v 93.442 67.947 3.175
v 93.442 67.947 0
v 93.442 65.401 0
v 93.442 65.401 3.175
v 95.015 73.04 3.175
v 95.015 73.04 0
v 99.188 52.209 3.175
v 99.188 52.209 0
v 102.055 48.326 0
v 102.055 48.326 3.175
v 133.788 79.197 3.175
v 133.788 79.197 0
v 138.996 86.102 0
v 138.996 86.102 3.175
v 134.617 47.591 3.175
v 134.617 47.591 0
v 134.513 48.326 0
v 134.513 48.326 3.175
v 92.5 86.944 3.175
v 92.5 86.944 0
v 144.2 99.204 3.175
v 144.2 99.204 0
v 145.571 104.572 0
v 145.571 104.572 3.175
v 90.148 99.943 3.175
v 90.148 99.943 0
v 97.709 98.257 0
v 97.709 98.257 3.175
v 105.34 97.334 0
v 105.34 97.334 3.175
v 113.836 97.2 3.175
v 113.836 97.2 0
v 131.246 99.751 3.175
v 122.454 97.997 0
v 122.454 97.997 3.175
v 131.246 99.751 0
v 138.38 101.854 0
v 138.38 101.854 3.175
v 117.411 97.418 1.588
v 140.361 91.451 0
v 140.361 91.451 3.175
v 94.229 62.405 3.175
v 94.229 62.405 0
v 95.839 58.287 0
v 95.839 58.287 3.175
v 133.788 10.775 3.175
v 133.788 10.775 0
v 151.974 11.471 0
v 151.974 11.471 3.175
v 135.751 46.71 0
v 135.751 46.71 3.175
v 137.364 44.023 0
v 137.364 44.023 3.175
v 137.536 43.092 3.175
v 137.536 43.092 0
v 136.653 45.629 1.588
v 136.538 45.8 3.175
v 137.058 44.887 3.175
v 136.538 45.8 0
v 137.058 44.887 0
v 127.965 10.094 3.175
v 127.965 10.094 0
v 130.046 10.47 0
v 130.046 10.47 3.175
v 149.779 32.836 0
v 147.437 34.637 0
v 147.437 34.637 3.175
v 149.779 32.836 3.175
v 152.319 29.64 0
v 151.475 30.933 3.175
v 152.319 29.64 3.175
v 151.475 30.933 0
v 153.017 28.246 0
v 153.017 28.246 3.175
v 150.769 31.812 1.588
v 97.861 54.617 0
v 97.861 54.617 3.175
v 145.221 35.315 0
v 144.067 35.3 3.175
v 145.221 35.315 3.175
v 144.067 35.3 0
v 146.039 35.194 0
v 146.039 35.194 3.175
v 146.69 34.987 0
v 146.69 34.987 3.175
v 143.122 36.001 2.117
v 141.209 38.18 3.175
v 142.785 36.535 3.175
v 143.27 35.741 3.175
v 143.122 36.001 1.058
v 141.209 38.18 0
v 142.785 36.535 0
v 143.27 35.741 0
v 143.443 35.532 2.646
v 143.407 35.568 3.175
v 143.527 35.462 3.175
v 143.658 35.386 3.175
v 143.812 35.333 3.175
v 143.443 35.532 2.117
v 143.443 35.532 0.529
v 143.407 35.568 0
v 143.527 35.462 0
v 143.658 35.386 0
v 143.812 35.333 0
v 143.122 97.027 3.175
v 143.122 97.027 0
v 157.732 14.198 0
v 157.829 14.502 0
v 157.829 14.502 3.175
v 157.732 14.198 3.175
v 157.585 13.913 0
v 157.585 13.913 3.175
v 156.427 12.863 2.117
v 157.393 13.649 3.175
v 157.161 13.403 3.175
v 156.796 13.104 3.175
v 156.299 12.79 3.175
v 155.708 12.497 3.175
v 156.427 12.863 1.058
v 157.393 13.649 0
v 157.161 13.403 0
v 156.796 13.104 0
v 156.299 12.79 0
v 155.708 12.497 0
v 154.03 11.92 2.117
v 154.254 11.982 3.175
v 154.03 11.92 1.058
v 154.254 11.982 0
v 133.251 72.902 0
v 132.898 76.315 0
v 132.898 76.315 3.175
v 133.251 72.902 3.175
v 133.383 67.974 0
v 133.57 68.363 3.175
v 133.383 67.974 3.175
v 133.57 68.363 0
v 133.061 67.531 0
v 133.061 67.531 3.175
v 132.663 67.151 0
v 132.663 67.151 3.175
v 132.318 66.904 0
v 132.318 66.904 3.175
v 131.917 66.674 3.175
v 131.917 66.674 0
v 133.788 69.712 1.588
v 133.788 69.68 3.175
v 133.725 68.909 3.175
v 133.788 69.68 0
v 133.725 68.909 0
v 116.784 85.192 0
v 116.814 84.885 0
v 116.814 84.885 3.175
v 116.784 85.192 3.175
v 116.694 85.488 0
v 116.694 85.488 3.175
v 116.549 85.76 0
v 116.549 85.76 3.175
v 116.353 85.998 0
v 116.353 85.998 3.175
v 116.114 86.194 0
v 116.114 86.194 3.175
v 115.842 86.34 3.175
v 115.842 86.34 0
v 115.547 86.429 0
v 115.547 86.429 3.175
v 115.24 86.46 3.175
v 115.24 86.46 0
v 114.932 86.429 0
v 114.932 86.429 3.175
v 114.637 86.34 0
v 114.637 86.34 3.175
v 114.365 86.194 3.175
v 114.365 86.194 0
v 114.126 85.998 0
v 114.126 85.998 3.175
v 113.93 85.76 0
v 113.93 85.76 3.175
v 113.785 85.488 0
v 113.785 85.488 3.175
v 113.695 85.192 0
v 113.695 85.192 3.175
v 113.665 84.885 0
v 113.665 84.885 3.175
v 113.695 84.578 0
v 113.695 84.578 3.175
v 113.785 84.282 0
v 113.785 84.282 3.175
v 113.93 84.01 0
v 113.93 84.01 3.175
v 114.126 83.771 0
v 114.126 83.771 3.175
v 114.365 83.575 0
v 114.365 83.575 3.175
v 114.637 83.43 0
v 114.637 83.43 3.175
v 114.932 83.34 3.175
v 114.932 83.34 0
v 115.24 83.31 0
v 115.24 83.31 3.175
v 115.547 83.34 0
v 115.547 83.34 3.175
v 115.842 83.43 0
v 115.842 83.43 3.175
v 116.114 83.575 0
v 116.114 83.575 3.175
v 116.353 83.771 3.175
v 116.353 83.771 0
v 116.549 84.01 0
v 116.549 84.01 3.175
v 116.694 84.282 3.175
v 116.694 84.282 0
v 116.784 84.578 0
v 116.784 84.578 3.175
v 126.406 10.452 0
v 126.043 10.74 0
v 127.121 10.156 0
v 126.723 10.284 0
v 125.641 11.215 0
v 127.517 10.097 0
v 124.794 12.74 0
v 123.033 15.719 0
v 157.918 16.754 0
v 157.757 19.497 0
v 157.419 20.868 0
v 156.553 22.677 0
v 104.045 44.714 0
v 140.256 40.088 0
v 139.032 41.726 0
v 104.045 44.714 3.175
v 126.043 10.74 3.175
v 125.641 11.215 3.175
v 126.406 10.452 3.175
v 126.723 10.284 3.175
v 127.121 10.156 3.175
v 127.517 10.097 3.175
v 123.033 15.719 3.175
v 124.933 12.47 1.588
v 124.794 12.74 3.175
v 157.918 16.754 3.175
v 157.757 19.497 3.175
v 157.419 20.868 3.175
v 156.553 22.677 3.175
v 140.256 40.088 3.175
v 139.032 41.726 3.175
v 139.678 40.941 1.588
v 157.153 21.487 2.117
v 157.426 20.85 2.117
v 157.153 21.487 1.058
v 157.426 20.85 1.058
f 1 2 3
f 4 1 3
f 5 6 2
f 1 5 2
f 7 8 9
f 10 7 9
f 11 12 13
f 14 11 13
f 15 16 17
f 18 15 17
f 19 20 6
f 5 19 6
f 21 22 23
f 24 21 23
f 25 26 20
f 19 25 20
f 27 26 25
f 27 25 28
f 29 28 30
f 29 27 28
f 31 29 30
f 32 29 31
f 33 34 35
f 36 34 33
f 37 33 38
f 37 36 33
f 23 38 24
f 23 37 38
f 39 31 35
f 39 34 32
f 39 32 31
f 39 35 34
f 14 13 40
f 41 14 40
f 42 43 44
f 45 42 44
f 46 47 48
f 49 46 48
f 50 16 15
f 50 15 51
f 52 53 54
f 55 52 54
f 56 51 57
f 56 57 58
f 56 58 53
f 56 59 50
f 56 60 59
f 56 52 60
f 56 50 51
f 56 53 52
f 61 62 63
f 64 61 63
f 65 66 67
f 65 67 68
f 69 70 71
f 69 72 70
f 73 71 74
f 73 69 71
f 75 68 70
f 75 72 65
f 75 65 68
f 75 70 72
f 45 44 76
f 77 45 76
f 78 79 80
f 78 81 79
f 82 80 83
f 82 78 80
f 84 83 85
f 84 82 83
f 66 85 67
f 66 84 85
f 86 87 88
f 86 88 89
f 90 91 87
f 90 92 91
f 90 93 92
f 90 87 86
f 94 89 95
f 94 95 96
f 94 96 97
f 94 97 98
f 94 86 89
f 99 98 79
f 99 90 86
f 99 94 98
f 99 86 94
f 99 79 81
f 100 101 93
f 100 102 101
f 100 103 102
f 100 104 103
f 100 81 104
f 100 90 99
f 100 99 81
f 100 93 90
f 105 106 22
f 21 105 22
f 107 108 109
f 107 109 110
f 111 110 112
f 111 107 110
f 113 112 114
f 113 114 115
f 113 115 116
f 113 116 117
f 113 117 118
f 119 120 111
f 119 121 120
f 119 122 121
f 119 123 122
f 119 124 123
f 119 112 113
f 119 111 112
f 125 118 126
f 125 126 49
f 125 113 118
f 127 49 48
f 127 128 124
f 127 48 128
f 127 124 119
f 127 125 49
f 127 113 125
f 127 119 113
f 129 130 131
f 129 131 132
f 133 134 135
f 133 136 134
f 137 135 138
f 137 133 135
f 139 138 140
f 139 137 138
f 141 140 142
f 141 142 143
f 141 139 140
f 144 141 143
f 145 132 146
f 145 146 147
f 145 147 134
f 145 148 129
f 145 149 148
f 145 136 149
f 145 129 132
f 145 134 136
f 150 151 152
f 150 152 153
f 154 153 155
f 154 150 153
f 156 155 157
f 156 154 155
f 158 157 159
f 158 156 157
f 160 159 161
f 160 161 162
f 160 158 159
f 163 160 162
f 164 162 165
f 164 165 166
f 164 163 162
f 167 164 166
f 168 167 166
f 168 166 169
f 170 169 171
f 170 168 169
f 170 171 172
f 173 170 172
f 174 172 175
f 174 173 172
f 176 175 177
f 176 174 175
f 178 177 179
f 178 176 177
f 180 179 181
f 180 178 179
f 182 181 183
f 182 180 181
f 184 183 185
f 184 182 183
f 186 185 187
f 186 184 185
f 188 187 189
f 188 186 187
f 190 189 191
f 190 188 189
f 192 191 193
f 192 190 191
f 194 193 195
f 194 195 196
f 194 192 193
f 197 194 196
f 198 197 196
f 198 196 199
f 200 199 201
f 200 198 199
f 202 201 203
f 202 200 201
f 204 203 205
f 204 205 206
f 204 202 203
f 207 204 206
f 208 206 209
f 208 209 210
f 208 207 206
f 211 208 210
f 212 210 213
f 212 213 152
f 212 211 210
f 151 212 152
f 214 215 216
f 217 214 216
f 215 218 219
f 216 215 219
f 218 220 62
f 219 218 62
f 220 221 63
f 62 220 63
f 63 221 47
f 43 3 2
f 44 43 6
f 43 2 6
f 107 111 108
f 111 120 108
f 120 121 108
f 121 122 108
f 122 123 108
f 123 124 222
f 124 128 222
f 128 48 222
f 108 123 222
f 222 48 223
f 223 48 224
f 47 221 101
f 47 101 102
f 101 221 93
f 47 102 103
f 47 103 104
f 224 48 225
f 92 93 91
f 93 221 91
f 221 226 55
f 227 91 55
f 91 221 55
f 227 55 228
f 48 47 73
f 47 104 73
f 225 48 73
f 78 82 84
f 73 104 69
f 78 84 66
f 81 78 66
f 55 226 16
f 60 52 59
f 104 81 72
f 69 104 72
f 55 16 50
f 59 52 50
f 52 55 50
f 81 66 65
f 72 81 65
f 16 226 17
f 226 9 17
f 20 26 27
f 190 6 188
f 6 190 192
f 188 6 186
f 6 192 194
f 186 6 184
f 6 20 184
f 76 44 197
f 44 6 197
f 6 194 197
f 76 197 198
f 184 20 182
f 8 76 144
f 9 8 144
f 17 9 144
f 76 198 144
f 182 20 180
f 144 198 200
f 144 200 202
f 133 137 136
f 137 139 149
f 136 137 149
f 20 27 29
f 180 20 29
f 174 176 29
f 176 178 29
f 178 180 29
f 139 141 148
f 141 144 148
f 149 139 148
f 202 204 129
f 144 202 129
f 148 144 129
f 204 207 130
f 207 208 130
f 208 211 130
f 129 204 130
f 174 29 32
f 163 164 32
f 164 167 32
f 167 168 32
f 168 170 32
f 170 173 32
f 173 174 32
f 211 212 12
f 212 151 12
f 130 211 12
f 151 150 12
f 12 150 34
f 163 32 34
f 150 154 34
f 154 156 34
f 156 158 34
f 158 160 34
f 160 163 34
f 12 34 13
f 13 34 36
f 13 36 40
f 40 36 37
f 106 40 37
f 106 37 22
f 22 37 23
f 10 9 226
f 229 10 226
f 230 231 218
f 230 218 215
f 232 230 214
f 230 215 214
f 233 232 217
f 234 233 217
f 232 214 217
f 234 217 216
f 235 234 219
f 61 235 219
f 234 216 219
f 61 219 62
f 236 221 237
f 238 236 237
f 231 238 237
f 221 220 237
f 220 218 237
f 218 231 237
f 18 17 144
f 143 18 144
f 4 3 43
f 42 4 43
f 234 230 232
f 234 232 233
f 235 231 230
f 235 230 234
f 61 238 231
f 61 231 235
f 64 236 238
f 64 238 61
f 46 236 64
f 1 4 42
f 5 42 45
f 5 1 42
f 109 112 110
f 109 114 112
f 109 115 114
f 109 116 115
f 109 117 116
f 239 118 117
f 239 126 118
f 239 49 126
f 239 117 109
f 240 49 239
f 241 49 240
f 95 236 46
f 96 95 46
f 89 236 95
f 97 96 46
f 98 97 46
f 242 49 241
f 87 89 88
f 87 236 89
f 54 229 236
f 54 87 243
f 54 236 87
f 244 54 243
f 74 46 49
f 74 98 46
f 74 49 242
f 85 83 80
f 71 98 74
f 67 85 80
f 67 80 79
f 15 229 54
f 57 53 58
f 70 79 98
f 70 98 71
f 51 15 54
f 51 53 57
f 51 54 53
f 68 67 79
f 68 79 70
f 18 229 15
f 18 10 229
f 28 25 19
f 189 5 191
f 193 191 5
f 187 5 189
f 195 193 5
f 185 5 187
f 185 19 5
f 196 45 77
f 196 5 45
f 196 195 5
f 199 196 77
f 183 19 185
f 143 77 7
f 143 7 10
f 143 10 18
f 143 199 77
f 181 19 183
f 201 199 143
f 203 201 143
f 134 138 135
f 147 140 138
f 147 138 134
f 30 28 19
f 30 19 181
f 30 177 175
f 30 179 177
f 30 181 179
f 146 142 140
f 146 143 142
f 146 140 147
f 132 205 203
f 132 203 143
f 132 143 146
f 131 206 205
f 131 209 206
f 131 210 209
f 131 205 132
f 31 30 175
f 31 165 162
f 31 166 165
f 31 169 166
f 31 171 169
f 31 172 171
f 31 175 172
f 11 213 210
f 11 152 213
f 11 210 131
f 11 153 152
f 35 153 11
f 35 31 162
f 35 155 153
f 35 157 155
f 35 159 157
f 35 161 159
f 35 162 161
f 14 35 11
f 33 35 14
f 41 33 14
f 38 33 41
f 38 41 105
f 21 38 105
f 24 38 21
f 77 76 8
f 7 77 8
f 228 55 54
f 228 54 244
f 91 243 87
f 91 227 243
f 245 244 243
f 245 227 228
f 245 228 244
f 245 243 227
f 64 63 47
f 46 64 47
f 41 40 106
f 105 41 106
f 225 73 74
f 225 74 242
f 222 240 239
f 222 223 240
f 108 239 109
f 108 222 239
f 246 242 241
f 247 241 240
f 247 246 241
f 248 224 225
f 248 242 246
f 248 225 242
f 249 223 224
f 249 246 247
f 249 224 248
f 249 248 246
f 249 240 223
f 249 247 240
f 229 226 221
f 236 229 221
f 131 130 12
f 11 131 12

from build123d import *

# Parameters (mm, degrees)
SKETCH1_R           = 1.5748
BOSS_EXTRUDE2_DEPTH = 3.175


with BuildPart() as part:
    # Sketch1 → Boss-Extrude2 (new body)
    with BuildSketch(Plane.XY):
        with BuildLine():
            Line((95.015088918, 73.039622028), (93.442430116, 67.947203051))
            Line((93.442430116, 67.947203051), (93.442430116, 65.400993562))
            Line((93.442430116, 65.400993562), (94.228759517, 62.405452988))
            Line((94.228759517, 62.405452988), (95.838862576, 58.286584697))
            Line((95.838862576, 58.286584697), (97.860852464, 54.617047494))
            Line((97.860852464, 54.617047494), (99.187742953, 52.208986977))
            Line((99.187742953, 52.208986977), (102.054609268, 48.326412287))
            Line((102.054609268, 48.326412287), (104.044945002, 44.714321512))
            Line((104.044945002, 44.714321512), (123.032849585, 15.718572297))
            add(Edge.make_bspline(
                [(123.032849585, 15.718572297), (123.714332191, 14.723172575), (125.027867192, 12.417046111), (126.13133155, 9.993338557), (127.965130812, 10.093714094)],
                knots=[0, 0, 0, 0, 0.482545384, 1, 1, 1, 1], degree=3))
            Line((127.965130812, 10.093714094), (130.045906785, 10.470125175))
            Line((130.045906785, 10.470125175), (133.787640512, 10.774684897))
            Line((133.787640512, 10.774684897), (151.974206763, 11.470821404))
            add(Edge.make_bspline(
                [(157.829388483, 14.502166506), (157.371014603, 12.448651519), (153.413195637, 11.740221824), (151.974206763, 11.470821404)],
                knots=[0, 0, 0, 0, 1, 1, 1, 1], degree=3))
            add(Edge.make_bspline(
                [(153.017246456, 28.246281812), (155.053521845, 25.097258497), (156.168563434, 23.654410632), (158.146330261, 19.312087579), (157.900569474, 15.925786313), (157.829388483, 14.502166506)],
                knots=[0, 0, 0, 0, 0.545638179, 0.593853925, 1, 1, 1, 1], degree=3))
            add(Edge.make_bspline(
                [(147.437307536, 34.637439041), (151.311718476, 32.18181338), (153.017246456, 28.246281812)],
                knots=[0, 0, 0, 1, 1, 1], degree=2))
            add(Edge.make_bspline(
                [(141.208586267, 38.180201711), (142.057807777, 37.336444115), (142.696530206, 36.831682565), (143.864835089, 34.558137065), (144.807852022, 36.057345018), (147.437307536, 34.637439041)],
                knots=[0, 0, 0, 0, 0.387994133, 0.411004513, 1, 1, 1, 1], degree=3))
            add(Edge.make_bspline(
                [(137.536109778, 43.092261061), (139.98410163, 41.245320741), (141.208586267, 38.180201711)],
                knots=[0, 0, 0, 1, 1, 1], degree=2))
            add(Edge.make_bspline(
                [(134.617377974, 47.591397428), (137.229688432, 45.916641925), (137.536109778, 43.092261061)],
                knots=[0, 0, 0, 1, 1, 1], degree=2))
            Line((134.617377974, 47.591397428), (134.513357882, 48.326412287))
            Line((134.513357882, 48.326412287), (131.916773648, 66.674098307))
            add(Edge.make_bspline(
                [(132.897509942, 76.314808247), (132.915948654, 73.197862503), (134.383448092, 69.97548856), (133.38418012, 67.42441049), (131.916773648, 66.674098307)],
                knots=[0, 0, 0, 0, 0.57532368, 1, 1, 1, 1], degree=3))
            Line((132.897509942, 76.314808247), (133.787640512, 79.197135805))
            Line((133.787640512, 79.197135805), (138.995570312, 86.101639813))
            Line((138.995570312, 86.101639813), (140.361296403, 91.450733668))
            Line((140.361296403, 91.450733668), (143.122445567, 97.027448538))
            Line((143.122445567, 97.027448538), (144.200087546, 99.203970593))
            Line((144.200087546, 99.203970593), (145.570696028, 104.572187149))
            add(Edge.make_bspline(
                [(90.14826379, 99.94311483), (116.963000062, 92.578435943), (145.570696028, 104.572187149)],
                knots=[0, 0, 0, 1, 1, 1], degree=2))
            Line((90.14826379, 99.94311483), (92.499806905, 86.943937416))
            Line((92.499806905, 86.943937416), (95.015088918, 73.039622028))
        make_face()
        with Locations((115.239537292, 84.884886181)):
            Circle(SKETCH1_R, mode=Mode.SUBTRACT)
    extrude(amount=BOSS_EXTRUDE2_DEPTH)


solid = part.part
